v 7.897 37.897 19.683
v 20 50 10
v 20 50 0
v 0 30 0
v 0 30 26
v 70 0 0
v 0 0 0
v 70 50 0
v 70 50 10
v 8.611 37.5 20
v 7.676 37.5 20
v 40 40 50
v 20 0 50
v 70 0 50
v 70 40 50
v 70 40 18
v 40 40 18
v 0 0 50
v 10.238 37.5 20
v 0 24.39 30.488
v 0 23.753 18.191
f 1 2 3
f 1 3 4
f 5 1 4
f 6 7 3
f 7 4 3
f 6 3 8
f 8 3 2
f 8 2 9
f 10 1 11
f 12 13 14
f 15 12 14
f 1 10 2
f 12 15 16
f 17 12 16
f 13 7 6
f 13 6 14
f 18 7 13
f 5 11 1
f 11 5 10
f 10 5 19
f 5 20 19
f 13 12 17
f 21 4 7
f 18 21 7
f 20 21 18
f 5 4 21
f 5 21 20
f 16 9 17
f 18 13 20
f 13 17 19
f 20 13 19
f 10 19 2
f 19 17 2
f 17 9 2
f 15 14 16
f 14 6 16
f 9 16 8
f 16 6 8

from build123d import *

# Parameters (mm, degrees)
SKETCH1_W            = 70
SKETCH1_H            = 50
BOSS_EXTRUDE1_DEPTH  = 50
CUT_EXTRUDE1_DEPTH   = 50
CUT_EXTRUDE2_DEPTH   = 81
CUT_EXTRUDE4_DEPTH   = 30
BOSS_EXTRUDE4_DEPTH  = 73
SKETCH7_W            = 70
SKETCH7_H            = 50
CUT_EXTRUDE5_DEPTH   = 73
SKETCH8_W            = 70
SKETCH8_H            = 50
CUT_EXTRUDE6_DEPTH   = 73
CUT_EXTRUDE7_DEPTH   = 73
CUT_EXTRUDE8_DEPTH   = 73
CUT_EXTRUDE9_DEPTH   = 73
CUT_EXTRUDE10_DEPTH  = 73
CUT_EXTRUDE11_DEPTH  = 73
CUT_EXTRUDE12_DEPTH  = 73
CUT_EXTRUDE13_DEPTH  = 73
CUT_EXTRUDE14_DEPTH  = 73
CUT_EXTRUDE15_DEPTH  = 73
CUT_EXTRUDE16_DEPTH  = 73
CUT_EXTRUDE17_DEPTH  = 73
BOSS_EXTRUDE6_DEPTH  = 40
BOSS_EXTRUDE9_DEPTH  = 20
CUT_EXTRUDE18_DEPTH  = 20
CUT_EXTRUDE19_DEPTH  = 20
CUT_EXTRUDE20_DEPTH  = 20
CUT_EXTRUDE21_DEPTH  = 20
CUT_EXTRUDE22_DEPTH  = 20
SKETCH28_W           = 25
SKETCH28_H           = 30
BOSS_EXTRUDE10_DEPTH = 20
CUT_EXTRUDE23_DEPTH  = 20
BOSS_EXTRUDE12_DEPTH = 10
CUT_EXTRUDE24_DEPTH  = 10
CUT_EXTRUDE25_DEPTH  = 10
CUT_EXTRUDE28_DEPTH  = 10
BOSS_EXTRUDE14_DEPTH = 35


with BuildPart() as part:
    # Sketch1 → Boss-Extrude1 (new body)
    with BuildSketch(Plane.XY):
        with Locations((35, 25)):
            Rectangle(SKETCH1_W, SKETCH1_H)
    extrude(amount=BOSS_EXTRUDE1_DEPTH)

    # Sketch2 → Cut-Extrude1 (cut)
    with BuildSketch(Plane.XY.offset(50)):
        Polygon((20, 50), (0, 30), (0, 50), align=None)
    extrude(amount=-CUT_EXTRUDE1_DEPTH, mode=Mode.SUBTRACT)

    # Sketch3 → Cut-Extrude2 (cut)
    with BuildSketch(Plane(origin=(70, 0, 0), x_dir=(0, 0, -1), z_dir=(1, 0, 0))):
        Polygon((-50, 40), (-20, 40), (-10, 50), (-50, 50), align=None)
    extrude(amount=-CUT_EXTRUDE2_DEPTH, mode=Mode.SUBTRACT)

    # Sketch4 → Cut-Extrude4 (cut)
    with BuildSketch(Plane.XY.offset(50)):
        Polygon((0, 0), (20, 0), (40, 40), (10, 40), (0, 30), align=None)
    extrude(amount=-CUT_EXTRUDE4_DEPTH, mode=Mode.SUBTRACT)

    # Sketch6 → Boss-Extrude4 (add)
    with BuildSketch(Plane(origin=(0, 24.390243902, 30.487804878), x_dir=(1, 0, 0), z_dir=(0, 0.624695048, 0.780868809))):
        Polygon((20, -31.234752378), (70, 32.796489997), (20, 32.796489997), align=None)
        Polygon((20, -31.234752378), (20, 32.796489997), (0, -31.234752378), align=None)
    extrude(amount=-BOSS_EXTRUDE4_DEPTH)

    # Sketch7 → Cut-Extrude5 (cut)
    with BuildSketch(Plane.XZ):
        with Locations((35, 25)):
            Rectangle(SKETCH7_W, SKETCH7_H)
    extrude(amount=CUT_EXTRUDE5_DEPTH, mode=Mode.SUBTRACT)

    # Sketch8 → Cut-Extrude6 (cut)
    with BuildSketch(Plane(origin=(0, 0, 0), x_dir=(-1, 0, 0), z_dir=(0, 0, -1))):
        with Locations((-35, 25)):
            Rectangle(SKETCH8_W, SKETCH8_H)
    extrude(amount=CUT_EXTRUDE6_DEPTH, mode=Mode.SUBTRACT)

    # Sketch9 → Cut-Extrude7 (cut)
    with BuildSketch(Plane.XY):
        Polygon((9.756097561, 0), (0, -40), (20, -40), (44.390243902, 0), align=None)
    extrude(amount=-CUT_EXTRUDE7_DEPTH, mode=Mode.SUBTRACT)

    # Sketch10 → Cut-Extrude8 (cut)
    with BuildSketch(Plane(origin=(32.359063313, -19.731136167, 0), x_dir=(0, 0, 1), z_dir=(-0.853796176, 0.520607424, 0))):
        Polygon((0, 23.109890541), (0, -23.739698546), (-11.485613867, -23.739698546), (-43.485613867, 23.109890541), align=None)
    extrude(amount=-CUT_EXTRUDE8_DEPTH, mode=Mode.SUBTRACT)

    # Sketch11 → Cut-Extrude9 (cut)
    with BuildSketch(Plane(origin=(0, 24.390243902, 30.487804878), x_dir=(1, 0, 0), z_dir=(0, 0.624695048, 0.780868809))):
        Polygon((0, -31.234752378), (20, -31.234752378), (70, 32.796489997), (20, 32.796489997), (0, 4.685212857), align=None)
    extrude(amount=CUT_EXTRUDE9_DEPTH, mode=Mode.SUBTRACT)

    # Sketch12 → Cut-Extrude10 (cut)
    with BuildSketch(Plane(origin=(-2.213114754, 1.229508197, -0.983606557), x_dir=(0.316569925, -0.17587218, -0.932122556), z_dir=(0.814821714, -0.45267873, 0.362142984))):
        Polygon((-22.511639083, 36.962823095), (-11.783436083, 53.42072243), (-22.511639083, 39.822720357), align=None)
    extrude(amount=-CUT_EXTRUDE10_DEPTH, mode=Mode.SUBTRACT)

    # Sketch13 → Cut-Extrude11 (cut)
    with BuildSketch(Plane(origin=(-7.126507887, 3.959171049, 20.983606557), x_dir=(-0.948569177, -0.058694552, -0.311081126), z_dir=(0.316569925, -0.17587218, -0.932122556))):
        Polygon((-18.055096359, 35.598308966), (-15.837888954, 33.59045957), (-16.59090279, 33.141654832), align=None)
    extrude(amount=-CUT_EXTRUDE11_DEPTH, mode=Mode.SUBTRACT)

    # Sketch14 → Cut-Extrude12 (cut)
    with BuildSketch(Plane(origin=(17.950733753, 32.311320755, 0), x_dir=(0.874157276, -0.485642931, 0), z_dir=(0.485642931, 0.874157276, 0))):
        Polygon((-11.501257989, -19.682539683), (-10.684144486, -20), (-11.501257989, -20), align=None)
    extrude(amount=-CUT_EXTRUDE12_DEPTH, mode=Mode.SUBTRACT)

    # Sketch15 → Cut-Extrude13 (cut)
    with BuildSketch(Plane(origin=(0, 0, 0), x_dir=(1, 0, 0), z_dir=(0, 1, 0))):
        Polygon((44.390243902, 43.485613867), (44.390243902, 0), (65.602738471, 43.485613867), align=None)
    extrude(amount=-CUT_EXTRUDE13_DEPTH, mode=Mode.SUBTRACT)

    # Sketch16 → Cut-Extrude14 (cut)
    with BuildSketch(Plane(origin=(0, -40, 0), x_dir=(1, 0, 0), z_dir=(0, 1, 0))):
        Polygon((20, 11.485613867), (20, 0), (0, 0), (2.241095389, 11.485613867), align=None)
    extrude(amount=-CUT_EXTRUDE14_DEPTH, mode=Mode.SUBTRACT)

    # Sketch17 → Cut-Extrude15 (cut)
    with BuildSketch(Plane(origin=(0, 0, 0), x_dir=(0.191510359, 0, -0.981490592), z_dir=(0.981490592, 0, 0.191510359))):
        Polygon((11.702214937, -40), (7.135496913, -45.602738471), (0, -40), align=None)
    extrude(amount=-CUT_EXTRUDE15_DEPTH, mode=Mode.SUBTRACT)

    # Sketch18 → Cut-Extrude16 (cut)
    with BuildSketch(Plane.ZY.offset(-20)):
        Polygon((-7.003423089, -45.602738471), (0, -40), (-11.485613867, -40), align=None)
    extrude(amount=-CUT_EXTRUDE16_DEPTH, mode=Mode.SUBTRACT)

    # Sketch19 → Cut-Extrude17 (cut)
    with BuildSketch(Plane(origin=(0, -24.390243902, 19.512195122), x_dir=(1, 0, 0), z_dir=(0, -0.780868809, 0.624695048))):
        Polygon((0, -33.956559528), (1.366521578, -33.956559528), (0, -24.987801902), align=None)
    extrude(amount=-CUT_EXTRUDE17_DEPTH, mode=Mode.SUBTRACT)

    # Sketch20 → Boss-Extrude6 (add)
    with BuildSketch(Plane.XY.offset(50)):
        Polygon((20, 0), (70, 0), (70, 40), (40, 40), align=None)
    extrude(amount=-BOSS_EXTRUDE6_DEPTH)

    # Sketch22 → Boss-Extrude9 (add)
    with BuildSketch(Plane.ZY):
        Polygon((20, 0), (50, 0), (20, 50), align=None)
    extrude(amount=-BOSS_EXTRUDE9_DEPTH)

    # Sketch23 → Cut-Extrude18 (cut)
    with BuildSketch(Plane(origin=(0, 24.390243902, 30.487804878), x_dir=(1, 0, 0), z_dir=(0, 0.624695048, 0.780868809))):
        Polygon((0, -31.234752378), (20, 32.796489997), (20, -31.234752378), align=None)
    extrude(amount=CUT_EXTRUDE18_DEPTH, mode=Mode.SUBTRACT)

    # Sketch24 → Cut-Extrude19 (cut)
    with BuildSketch(Plane(origin=(0, 24.390243902, 30.487804878), x_dir=(1, 0, 0), z_dir=(0, 0.624695048, 0.780868809))):
        Polygon((20, 32.796489997), (20, -31.234752378), (0, -31.234752378), (0, 0), align=None)
    extrude(amount=CUT_EXTRUDE19_DEPTH, mode=Mode.SUBTRACT)

    # Sketch25 → Cut-Extrude20 (cut)
    with BuildSketch(Plane(origin=(0, 0, 0), x_dir=(0.293651999, -0.139834285, -0.945629354), z_dir=(0.85377141, -0.406557814, 0.325246251))):
        Polygon((-35.72624266, 24.401635644), (-32.240755571, 22.020988264), (-21.149935654, 38.258970398), (-21.149935654, 52.103855338), align=None)
    extrude(amount=-CUT_EXTRUDE20_DEPTH, mode=Mode.SUBTRACT)

    # Sketch26 → Cut-Extrude21 (cut)
    with BuildSketch(Plane(origin=(0, 0, 20), x_dir=(-1, 0, 0), z_dir=(0, 0, -1))):
        Polygon((0, 30), (0, 37.5), (-7.5, 37.5), align=None)
    extrude(amount=-CUT_EXTRUDE21_DEPTH, mode=Mode.SUBTRACT)

    # Sketch27 → Cut-Extrude22 (cut)
    with BuildSketch(Plane(origin=(-2.564728872, 23.387884709, 35.967269174), x_dir=(-0.998217939, -0.032530406, -0.050027178), z_dir=(0.059673661, -0.54416696, -0.836852062))):
        Polygon((-2.569307534, 16.733584836), (-2.569307534, 29.52608638), (-18.788687646, 31.014533667), (-9.963436703, 16.446669873), align=None)
    extrude(amount=-CUT_EXTRUDE22_DEPTH, mode=Mode.SUBTRACT)

    # Sketch28 → Boss-Extrude10 (add)
    with BuildSketch(Plane.ZY):
        with Locations((12.5, 15)):
            Rectangle(SKETCH28_W, SKETCH28_H)
    extrude(amount=-BOSS_EXTRUDE10_DEPTH)

    # Sketch29 → Cut-Extrude23 (cut)
    with BuildSketch(Plane(origin=(0, 0, 20), x_dir=(-1, 0, 0), z_dir=(0, 0, -1))):
        Polygon((0, 48.224543081), (0, 50), (-16.19047619, 50), align=None)
    extrude(amount=-CUT_EXTRUDE23_DEPTH, mode=Mode.SUBTRACT)

    # Sketch30 → Boss-Extrude12 (add)
    with BuildSketch(Plane(origin=(0, 24.390243902, 30.487804878), x_dir=(1, 0, 0), z_dir=(0, 0.624695048, 0.780868809))):
        Polygon((20, 32.796489997), (0, 7.183993047), (19.391822061, 9.570105394), align=None)
    extrude(amount=-BOSS_EXTRUDE12_DEPTH)

    # Sketch31 → Cut-Extrude24 (cut)
    with BuildSketch(Plane(origin=(-2.564728872, 23.387884709, 35.967269174), x_dir=(-0.998217939, -0.032530406, -0.050027178), z_dir=(0.059673661, -0.54416696, -0.836852062))):
        Polygon((-9.678751188, 15.976738782), (-2.569307534, 7.787398424), (-2.569307534, 4.241162369), align=None)
    extrude(amount=-CUT_EXTRUDE24_DEPTH, mode=Mode.SUBTRACT)

    # Sketch32 → Cut-Extrude25 (cut)
    with BuildSketch(Plane(origin=(0, 37.5, 0), x_dir=(-1, 0, 0), z_dir=(0, -1, 0))):
        Polygon((-7.380952381, -27.5), (0, -26.973684211), (0, -27.5), align=None)
    extrude(amount=-CUT_EXTRUDE25_DEPTH, mode=Mode.SUBTRACT)

    # Sketch35 → Cut-Extrude28 (cut)
    with BuildSketch(Plane(origin=(0, 24.390243902, 30.487804878), x_dir=(1, 0, 0), z_dir=(0, 0.624695048, 0.780868809))):
        Polygon((70, 32.796489997), (70, -31.234752378), (0, -31.234752378), align=None)
    extrude(amount=CUT_EXTRUDE28_DEPTH, mode=Mode.SUBTRACT)

    # Sketch36 → Boss-Extrude14 (add)
    with BuildSketch(Plane.XY.offset(50)):
        Polygon((70, 0), (70, 16.007810594), (28.003905297, 16.007810594), (20, 0), align=None)
        Polygon((40, 40), (28.003905297, 16.007810594), (70, 16.007810594), (70, 40), align=None)
    extrude(amount=-BOSS_EXTRUDE14_DEPTH)


solid = part.part
